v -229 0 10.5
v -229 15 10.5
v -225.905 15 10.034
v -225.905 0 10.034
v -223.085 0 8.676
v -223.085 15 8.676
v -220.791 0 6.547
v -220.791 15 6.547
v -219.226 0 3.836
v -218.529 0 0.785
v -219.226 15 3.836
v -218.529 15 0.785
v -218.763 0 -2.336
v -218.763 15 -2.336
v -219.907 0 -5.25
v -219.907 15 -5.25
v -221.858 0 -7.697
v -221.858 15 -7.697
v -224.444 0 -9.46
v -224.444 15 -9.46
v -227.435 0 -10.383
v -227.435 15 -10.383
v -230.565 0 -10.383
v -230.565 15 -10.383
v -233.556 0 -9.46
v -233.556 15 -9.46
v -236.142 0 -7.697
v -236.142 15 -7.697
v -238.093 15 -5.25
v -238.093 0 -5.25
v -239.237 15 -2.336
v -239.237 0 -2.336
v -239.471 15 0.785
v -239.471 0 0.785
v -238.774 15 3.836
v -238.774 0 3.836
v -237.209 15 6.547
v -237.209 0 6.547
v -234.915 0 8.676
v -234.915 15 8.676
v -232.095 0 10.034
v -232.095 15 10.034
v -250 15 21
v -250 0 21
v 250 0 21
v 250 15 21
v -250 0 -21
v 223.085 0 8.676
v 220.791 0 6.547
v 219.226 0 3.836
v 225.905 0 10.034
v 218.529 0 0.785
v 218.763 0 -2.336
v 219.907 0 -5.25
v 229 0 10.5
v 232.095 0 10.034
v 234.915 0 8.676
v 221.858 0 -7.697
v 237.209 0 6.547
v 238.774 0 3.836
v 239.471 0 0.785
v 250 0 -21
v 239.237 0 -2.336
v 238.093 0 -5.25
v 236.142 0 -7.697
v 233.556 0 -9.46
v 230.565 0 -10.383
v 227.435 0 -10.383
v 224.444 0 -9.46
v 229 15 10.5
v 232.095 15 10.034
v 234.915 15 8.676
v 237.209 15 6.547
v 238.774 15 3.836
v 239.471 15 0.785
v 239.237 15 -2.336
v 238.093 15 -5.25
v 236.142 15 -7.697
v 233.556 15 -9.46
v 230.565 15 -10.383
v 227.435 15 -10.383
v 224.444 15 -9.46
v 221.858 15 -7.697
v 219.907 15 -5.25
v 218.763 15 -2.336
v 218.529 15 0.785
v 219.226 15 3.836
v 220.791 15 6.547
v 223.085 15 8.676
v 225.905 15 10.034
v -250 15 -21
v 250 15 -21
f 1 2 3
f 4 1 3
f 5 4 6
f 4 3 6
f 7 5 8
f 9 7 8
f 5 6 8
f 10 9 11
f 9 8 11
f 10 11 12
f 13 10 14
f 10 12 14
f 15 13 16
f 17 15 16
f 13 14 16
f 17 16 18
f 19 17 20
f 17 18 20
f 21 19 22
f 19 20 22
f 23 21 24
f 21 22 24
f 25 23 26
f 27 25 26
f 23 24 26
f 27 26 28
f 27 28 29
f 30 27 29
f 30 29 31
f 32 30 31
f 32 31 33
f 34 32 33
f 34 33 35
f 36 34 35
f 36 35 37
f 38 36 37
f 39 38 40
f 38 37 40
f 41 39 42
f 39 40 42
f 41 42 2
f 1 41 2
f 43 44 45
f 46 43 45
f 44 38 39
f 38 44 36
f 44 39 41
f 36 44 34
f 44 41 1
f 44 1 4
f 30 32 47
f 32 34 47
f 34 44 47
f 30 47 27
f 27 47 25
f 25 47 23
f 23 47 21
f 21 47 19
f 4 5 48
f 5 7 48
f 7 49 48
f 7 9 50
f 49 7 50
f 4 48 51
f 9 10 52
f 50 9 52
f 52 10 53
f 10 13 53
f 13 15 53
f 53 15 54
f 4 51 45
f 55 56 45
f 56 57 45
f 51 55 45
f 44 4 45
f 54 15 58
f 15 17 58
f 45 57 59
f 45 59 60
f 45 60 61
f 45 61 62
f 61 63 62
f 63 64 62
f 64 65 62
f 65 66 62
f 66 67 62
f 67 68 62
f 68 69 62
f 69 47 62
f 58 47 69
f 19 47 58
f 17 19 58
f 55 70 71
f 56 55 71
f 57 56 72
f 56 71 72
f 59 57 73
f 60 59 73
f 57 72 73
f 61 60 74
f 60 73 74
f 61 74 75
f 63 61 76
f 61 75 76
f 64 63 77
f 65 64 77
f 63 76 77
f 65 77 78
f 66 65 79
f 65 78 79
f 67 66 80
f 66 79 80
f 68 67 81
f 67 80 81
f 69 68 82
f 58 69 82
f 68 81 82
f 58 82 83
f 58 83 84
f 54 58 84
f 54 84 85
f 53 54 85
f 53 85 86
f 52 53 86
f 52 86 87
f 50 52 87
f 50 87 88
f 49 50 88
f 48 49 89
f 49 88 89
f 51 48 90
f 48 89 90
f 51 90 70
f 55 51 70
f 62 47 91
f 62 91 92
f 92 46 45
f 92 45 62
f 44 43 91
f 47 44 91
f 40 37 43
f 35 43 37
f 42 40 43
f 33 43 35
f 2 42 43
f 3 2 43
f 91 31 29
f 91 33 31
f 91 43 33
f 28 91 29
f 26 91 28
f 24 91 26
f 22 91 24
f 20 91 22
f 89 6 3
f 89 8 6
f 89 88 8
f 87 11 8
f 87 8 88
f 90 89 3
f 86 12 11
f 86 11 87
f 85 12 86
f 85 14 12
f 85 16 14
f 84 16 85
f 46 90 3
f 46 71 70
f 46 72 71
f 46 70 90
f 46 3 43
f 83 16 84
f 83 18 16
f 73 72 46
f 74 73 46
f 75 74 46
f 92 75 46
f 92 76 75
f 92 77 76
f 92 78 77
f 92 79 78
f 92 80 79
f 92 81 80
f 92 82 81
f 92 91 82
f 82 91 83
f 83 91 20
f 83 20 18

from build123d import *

# Parameters (mm, degrees)
ESQUISSE1_W             = 520
ESQUISSE1_H             = 42
BOSS_EXTRU_1_DEPTH      = 15
ESQUISSE2_R             = 10.5
ENL_V_MAT_EXTRU_1_DEPTH = 15
ESQUISSE3_W             = 10
ESQUISSE3_H             = 42
ENL_V_MAT_EXTRU_2_DEPTH = 262.277630118


with BuildPart() as part:
    # Esquisse1 → Boss.-Extru.1 (new body)
    with BuildSketch(Plane(origin=(0, 0, 0), x_dir=(1, 0, 0), z_dir=(0, 1, 0))):
        Rectangle(ESQUISSE1_W, ESQUISSE1_H)
    extrude(amount=BOSS_EXTRU_1_DEPTH)

    # Esquisse2 → Enlèv. mat.-Extru.1 (cut)
    with BuildSketch(Plane(origin=(0, 15, 0), x_dir=(1, 0, 0), z_dir=(0, 1, 0))):
        with Locations(Location((-229, 0, 0), (0, 0, 270))):
            Circle(ESQUISSE2_R)
        with Locations(Location((229, 0, 0), (0, 0, 270))):
            Circle(ESQUISSE2_R)
    extrude(amount=-ENL_V_MAT_EXTRU_1_DEPTH, mode=Mode.SUBTRACT)

    # Esquisse3 → Enlèv. mat.-Extru.2 (cut, through all)
    with BuildSketch(Plane(origin=(0, 15, 0), x_dir=(1, 0, 0), z_dir=(0, 1, 0))):
        with Locations((-255, 0)):
            Rectangle(ESQUISSE3_W, ESQUISSE3_H)
        with Locations((255, 0)):
            Rectangle(ESQUISSE3_W, ESQUISSE3_H)
    extrude(amount=-ENL_V_MAT_EXTRU_2_DEPTH, mode=Mode.SUBTRACT)


solid = part.part
